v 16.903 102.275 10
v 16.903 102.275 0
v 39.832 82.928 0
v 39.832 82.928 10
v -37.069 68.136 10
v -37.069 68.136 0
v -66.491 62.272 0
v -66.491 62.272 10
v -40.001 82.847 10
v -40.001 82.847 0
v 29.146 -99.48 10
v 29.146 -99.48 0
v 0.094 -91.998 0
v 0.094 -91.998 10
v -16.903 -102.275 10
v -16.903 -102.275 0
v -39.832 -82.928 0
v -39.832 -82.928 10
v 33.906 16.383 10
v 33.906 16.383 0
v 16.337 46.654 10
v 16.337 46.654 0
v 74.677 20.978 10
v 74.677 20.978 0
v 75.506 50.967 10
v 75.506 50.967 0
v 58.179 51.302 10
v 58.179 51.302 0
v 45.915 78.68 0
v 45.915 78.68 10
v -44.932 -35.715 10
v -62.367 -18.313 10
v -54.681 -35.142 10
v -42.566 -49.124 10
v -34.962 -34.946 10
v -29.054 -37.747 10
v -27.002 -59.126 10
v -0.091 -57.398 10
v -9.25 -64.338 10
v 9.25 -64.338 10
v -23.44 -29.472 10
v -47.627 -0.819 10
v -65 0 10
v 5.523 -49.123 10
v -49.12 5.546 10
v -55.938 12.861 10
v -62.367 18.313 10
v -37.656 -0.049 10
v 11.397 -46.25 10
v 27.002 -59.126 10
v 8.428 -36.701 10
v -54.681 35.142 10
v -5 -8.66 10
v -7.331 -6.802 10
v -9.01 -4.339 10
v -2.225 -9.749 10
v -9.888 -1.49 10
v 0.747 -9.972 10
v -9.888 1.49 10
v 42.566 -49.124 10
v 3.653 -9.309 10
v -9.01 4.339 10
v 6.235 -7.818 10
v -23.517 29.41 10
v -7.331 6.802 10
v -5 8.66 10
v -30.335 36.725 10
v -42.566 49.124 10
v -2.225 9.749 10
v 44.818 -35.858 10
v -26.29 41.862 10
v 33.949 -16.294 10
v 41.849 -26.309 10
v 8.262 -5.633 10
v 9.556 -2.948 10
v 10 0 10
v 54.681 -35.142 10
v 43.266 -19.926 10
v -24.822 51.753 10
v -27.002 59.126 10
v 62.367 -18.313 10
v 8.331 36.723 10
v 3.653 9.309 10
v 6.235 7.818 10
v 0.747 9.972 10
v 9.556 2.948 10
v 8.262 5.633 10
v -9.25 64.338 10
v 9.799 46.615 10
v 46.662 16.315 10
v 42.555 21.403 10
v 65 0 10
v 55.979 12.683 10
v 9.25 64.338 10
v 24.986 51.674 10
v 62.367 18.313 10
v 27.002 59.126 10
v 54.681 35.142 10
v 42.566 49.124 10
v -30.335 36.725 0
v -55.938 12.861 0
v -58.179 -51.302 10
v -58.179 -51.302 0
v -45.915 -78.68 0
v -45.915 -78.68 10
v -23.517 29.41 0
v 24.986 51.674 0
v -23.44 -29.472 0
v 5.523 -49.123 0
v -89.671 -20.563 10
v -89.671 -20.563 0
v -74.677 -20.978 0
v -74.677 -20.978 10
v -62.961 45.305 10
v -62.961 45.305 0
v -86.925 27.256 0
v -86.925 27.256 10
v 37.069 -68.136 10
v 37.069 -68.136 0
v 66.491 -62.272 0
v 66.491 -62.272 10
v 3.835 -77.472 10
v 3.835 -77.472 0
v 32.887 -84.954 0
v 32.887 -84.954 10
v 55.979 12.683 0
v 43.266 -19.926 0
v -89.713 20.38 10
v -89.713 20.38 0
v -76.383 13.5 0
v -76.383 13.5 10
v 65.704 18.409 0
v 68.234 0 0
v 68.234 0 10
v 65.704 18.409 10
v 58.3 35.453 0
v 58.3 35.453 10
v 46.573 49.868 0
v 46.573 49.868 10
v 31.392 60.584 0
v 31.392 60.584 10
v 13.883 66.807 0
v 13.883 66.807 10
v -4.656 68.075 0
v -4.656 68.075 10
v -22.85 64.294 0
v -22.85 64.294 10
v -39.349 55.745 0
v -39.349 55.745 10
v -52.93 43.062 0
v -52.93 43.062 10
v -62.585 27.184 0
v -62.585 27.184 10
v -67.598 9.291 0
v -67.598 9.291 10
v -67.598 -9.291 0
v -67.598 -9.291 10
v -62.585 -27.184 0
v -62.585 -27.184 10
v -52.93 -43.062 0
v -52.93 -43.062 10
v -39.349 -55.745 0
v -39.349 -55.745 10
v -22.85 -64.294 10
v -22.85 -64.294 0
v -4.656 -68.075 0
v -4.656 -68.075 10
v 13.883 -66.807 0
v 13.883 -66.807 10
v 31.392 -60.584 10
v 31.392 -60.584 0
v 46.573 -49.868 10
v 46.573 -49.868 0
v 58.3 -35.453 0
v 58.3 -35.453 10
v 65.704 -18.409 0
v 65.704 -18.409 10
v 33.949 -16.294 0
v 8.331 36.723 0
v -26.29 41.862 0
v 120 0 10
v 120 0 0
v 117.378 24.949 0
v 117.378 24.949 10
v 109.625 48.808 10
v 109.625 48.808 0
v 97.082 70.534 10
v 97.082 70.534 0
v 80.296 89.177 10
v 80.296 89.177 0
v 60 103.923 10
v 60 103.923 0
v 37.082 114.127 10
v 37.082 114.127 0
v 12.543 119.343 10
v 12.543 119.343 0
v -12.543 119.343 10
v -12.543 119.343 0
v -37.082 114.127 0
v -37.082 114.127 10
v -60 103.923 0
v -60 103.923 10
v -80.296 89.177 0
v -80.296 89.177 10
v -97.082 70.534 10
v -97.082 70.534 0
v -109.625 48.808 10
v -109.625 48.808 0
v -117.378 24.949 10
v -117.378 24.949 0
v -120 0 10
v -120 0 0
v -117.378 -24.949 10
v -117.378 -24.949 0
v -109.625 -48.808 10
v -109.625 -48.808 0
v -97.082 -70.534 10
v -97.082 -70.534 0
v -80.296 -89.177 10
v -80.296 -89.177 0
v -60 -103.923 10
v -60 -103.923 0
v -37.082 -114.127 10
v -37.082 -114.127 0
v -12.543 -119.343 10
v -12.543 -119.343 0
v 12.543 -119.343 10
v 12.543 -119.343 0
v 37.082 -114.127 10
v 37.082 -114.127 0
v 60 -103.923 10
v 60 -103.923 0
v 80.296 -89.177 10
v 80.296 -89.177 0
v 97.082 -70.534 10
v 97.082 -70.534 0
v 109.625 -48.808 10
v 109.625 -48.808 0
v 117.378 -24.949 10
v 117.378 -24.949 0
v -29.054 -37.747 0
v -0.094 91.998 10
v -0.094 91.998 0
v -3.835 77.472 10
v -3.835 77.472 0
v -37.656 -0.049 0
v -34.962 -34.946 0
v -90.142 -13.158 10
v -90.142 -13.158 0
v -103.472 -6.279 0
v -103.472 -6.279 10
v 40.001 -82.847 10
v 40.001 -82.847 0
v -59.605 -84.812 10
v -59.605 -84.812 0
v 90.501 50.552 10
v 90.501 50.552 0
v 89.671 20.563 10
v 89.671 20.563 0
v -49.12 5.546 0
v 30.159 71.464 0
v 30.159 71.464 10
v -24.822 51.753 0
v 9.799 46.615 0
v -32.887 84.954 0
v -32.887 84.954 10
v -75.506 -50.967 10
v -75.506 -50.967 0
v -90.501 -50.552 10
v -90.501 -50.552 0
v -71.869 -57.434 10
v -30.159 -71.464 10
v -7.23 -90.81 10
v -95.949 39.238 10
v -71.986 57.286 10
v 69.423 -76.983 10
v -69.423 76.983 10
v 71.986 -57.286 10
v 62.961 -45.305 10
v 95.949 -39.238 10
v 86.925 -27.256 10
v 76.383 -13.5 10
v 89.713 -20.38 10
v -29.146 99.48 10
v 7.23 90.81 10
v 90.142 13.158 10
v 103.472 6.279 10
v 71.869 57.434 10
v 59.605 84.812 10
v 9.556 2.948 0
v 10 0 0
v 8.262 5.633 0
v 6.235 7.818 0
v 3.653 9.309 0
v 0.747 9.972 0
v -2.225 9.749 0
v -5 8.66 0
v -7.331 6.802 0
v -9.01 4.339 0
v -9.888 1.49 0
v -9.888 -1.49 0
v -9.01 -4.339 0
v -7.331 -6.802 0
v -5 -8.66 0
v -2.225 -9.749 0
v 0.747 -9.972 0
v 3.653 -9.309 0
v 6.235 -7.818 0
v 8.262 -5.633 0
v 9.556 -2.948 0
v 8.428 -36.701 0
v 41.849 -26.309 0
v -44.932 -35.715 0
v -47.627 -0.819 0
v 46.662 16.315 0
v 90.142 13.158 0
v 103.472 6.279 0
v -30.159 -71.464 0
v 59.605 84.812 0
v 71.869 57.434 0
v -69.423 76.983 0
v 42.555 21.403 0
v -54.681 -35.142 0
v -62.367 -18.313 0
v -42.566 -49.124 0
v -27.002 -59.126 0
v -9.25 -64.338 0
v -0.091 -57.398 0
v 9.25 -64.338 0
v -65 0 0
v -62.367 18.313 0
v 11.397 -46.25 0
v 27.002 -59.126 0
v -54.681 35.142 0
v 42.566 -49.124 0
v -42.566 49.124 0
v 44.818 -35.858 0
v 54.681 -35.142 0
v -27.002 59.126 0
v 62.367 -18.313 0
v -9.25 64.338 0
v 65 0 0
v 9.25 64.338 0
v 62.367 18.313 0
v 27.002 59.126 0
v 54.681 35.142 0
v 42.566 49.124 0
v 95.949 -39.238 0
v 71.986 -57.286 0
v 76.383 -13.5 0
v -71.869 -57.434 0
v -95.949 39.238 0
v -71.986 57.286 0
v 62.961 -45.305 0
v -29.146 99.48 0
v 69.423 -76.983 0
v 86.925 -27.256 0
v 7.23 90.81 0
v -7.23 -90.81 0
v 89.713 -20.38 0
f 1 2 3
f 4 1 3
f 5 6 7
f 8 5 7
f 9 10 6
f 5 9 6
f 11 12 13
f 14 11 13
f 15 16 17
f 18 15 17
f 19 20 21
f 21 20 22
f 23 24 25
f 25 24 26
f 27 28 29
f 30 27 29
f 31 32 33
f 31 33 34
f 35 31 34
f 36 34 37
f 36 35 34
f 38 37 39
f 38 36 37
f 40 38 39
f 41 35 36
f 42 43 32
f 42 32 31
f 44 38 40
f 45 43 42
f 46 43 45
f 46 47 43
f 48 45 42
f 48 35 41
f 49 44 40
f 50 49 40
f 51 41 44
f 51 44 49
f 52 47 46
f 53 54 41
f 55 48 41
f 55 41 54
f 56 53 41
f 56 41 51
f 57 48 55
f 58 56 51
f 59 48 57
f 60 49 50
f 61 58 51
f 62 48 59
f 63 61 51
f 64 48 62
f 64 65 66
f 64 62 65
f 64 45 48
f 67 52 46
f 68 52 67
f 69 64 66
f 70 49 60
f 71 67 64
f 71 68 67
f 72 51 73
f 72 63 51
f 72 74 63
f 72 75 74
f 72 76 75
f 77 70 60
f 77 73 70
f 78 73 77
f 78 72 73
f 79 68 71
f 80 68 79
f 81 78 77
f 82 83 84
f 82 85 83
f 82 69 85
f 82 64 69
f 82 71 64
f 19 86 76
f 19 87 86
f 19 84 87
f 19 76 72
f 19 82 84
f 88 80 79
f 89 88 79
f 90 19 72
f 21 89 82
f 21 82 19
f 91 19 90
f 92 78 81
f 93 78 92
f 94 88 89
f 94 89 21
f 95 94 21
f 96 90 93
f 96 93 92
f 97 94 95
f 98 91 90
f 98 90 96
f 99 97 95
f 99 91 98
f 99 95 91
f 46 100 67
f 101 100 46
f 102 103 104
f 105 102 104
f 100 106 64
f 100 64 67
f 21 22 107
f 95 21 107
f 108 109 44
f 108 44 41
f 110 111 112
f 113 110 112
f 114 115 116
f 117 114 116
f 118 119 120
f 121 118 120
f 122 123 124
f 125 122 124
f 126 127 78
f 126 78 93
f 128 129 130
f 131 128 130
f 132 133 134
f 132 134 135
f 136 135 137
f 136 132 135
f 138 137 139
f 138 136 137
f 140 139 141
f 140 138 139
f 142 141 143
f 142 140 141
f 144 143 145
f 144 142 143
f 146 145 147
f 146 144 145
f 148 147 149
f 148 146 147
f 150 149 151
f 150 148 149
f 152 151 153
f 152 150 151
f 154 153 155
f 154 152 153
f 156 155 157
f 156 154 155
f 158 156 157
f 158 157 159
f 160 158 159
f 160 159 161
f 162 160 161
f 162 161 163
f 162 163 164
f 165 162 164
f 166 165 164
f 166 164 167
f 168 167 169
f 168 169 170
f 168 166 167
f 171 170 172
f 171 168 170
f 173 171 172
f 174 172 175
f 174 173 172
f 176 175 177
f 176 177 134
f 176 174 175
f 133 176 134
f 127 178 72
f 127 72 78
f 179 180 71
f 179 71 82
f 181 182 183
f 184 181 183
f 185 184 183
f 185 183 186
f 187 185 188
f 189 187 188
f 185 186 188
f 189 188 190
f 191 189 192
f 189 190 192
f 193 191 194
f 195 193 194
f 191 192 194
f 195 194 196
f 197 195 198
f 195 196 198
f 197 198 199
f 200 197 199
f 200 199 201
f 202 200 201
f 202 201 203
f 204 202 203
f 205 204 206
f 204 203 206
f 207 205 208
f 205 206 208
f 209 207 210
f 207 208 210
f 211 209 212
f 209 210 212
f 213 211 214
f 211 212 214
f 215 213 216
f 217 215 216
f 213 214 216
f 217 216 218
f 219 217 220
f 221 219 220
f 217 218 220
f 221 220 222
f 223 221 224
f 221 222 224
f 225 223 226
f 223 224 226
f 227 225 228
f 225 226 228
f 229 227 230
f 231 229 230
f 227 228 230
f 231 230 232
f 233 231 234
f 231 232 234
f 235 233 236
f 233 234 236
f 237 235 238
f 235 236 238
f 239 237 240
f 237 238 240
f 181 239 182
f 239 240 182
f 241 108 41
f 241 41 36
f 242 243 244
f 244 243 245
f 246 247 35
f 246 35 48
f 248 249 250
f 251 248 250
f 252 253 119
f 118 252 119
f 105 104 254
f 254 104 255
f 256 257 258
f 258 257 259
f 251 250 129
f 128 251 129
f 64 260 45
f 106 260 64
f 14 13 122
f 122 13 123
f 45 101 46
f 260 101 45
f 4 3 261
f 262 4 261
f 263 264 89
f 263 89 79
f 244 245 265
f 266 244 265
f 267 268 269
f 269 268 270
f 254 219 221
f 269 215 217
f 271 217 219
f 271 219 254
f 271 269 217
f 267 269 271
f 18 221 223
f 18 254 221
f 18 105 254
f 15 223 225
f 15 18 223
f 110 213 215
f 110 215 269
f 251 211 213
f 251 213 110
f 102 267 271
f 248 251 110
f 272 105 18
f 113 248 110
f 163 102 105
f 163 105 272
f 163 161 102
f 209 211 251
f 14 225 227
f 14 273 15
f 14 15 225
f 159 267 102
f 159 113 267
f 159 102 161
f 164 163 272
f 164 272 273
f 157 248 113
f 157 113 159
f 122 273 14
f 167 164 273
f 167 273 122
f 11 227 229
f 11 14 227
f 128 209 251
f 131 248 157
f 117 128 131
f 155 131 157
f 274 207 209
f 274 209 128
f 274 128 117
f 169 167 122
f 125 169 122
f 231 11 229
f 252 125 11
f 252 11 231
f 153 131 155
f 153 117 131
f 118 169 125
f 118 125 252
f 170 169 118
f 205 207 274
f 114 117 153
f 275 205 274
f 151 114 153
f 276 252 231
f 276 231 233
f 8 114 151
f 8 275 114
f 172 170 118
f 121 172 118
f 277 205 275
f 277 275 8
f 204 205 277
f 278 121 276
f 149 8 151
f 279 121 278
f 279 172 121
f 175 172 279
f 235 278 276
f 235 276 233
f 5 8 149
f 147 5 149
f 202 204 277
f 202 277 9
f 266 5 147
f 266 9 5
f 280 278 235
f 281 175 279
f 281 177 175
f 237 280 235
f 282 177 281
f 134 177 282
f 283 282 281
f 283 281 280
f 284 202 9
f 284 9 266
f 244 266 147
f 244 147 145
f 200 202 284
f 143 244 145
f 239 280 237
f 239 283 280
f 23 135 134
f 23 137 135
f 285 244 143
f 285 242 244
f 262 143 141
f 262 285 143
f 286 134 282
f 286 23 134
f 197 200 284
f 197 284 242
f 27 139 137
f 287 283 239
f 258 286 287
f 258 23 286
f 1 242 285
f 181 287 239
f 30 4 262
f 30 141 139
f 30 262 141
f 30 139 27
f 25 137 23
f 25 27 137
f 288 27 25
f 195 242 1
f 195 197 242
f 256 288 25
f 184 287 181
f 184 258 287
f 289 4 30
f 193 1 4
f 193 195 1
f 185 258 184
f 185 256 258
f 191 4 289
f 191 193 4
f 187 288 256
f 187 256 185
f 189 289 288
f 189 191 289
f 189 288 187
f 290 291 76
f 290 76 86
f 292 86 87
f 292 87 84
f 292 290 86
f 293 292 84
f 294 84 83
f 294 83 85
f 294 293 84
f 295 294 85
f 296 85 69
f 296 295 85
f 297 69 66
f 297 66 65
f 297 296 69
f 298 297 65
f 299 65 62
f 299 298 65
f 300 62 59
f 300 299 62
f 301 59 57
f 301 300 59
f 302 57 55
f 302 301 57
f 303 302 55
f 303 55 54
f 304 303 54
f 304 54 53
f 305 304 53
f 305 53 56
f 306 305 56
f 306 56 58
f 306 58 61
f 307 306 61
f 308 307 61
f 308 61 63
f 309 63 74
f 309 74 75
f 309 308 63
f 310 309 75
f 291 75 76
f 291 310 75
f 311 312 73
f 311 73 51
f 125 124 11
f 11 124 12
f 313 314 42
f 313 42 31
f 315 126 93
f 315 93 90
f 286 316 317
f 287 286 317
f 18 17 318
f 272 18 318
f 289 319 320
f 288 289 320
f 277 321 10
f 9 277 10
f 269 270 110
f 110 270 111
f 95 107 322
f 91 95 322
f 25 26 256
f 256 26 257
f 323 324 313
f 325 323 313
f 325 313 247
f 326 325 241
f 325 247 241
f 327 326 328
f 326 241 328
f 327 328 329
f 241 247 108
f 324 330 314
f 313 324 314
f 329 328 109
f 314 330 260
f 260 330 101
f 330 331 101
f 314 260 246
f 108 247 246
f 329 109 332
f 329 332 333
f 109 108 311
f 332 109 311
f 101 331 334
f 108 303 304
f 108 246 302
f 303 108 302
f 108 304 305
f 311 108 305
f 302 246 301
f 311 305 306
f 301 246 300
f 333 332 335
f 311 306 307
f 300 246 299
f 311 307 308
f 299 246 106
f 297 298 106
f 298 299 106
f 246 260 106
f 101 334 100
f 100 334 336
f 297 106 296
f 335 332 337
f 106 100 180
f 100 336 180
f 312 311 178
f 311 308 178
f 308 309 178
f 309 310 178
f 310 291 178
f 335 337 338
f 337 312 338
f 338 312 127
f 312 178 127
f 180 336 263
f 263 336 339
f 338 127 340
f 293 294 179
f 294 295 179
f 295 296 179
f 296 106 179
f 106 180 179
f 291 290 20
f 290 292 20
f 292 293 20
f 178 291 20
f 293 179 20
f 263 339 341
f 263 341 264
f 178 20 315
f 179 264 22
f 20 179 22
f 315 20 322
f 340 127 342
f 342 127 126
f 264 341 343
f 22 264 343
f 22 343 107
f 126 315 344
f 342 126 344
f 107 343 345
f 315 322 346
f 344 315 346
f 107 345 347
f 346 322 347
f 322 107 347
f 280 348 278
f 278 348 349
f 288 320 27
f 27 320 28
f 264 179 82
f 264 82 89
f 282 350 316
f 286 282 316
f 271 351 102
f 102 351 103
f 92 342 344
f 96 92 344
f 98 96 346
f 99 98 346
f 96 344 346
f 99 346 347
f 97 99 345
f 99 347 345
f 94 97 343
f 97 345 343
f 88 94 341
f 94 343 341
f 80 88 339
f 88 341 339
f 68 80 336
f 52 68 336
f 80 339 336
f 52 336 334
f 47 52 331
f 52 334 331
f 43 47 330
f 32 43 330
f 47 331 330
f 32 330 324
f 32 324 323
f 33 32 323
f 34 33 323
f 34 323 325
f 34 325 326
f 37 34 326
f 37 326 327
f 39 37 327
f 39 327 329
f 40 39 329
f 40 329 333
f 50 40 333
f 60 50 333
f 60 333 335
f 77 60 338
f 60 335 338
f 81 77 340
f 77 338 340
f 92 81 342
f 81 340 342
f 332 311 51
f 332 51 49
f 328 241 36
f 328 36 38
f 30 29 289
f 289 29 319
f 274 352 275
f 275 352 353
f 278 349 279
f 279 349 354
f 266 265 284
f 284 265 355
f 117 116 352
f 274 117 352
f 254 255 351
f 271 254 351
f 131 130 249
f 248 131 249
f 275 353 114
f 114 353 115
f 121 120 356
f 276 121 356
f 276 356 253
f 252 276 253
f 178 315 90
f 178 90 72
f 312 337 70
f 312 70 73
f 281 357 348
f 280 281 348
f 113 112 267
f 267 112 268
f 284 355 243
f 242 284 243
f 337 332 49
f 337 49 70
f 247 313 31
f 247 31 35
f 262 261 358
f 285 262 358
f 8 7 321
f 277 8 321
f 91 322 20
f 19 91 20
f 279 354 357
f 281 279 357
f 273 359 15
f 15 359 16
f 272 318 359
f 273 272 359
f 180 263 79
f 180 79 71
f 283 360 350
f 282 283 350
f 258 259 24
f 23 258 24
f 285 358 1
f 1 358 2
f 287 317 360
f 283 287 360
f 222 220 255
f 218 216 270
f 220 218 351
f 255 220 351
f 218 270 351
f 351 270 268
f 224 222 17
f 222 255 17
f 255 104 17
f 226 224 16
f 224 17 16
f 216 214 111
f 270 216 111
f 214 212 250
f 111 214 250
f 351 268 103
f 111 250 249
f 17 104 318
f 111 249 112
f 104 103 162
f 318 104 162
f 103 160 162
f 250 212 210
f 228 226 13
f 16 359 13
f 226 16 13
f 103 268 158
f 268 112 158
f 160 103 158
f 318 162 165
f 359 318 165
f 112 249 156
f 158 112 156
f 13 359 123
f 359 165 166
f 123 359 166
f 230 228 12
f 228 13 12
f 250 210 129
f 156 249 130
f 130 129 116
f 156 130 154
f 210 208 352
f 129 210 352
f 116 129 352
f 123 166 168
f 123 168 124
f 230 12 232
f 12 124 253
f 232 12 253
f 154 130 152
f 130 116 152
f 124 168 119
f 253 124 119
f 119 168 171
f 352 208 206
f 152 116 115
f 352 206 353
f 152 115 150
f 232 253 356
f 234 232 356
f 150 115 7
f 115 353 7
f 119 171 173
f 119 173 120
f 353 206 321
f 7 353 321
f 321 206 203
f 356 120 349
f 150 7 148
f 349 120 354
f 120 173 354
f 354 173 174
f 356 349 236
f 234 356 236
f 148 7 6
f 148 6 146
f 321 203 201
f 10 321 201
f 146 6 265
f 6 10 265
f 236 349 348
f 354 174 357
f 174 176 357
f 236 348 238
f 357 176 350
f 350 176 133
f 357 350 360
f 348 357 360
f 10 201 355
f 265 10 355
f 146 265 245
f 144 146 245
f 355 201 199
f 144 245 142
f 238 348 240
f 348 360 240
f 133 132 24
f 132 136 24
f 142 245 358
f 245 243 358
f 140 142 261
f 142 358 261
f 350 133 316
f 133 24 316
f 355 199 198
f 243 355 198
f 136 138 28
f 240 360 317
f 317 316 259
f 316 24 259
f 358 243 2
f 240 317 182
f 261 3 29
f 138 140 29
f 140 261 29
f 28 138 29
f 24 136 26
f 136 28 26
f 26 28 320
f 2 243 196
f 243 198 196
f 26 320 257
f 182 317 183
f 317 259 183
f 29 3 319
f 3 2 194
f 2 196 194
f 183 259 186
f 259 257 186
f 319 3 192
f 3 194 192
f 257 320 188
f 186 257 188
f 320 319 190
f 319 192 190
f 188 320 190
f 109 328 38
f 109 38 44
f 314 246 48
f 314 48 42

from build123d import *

# Parameters (mm, degrees)
SKETCH1_R             = 120
SKETCH1_R_2           = 68.233940928
BOSS_EXTRUDE1_DEPTH   = 10
SKETCH1_R_3           = 65
SKETCH1_R_4           = 10
BOSS_EXTRUDE1_2_DEPTH = 10


with BuildPart() as part:
    # Sketch1 → Boss-Extrude1 (new body)
    with BuildSketch(Plane.XY):
        Circle(SKETCH1_R)
        Circle(SKETCH1_R_2, mode=Mode.SUBTRACT)
        Polygon((58.179164054, 51.301559926), (45.915256889, 78.680321422), (59.604637637, 84.812275004), (71.868544802, 57.433513508), align=None, mode=Mode.SUBTRACT)
        Polygon((75.506329072, 50.966636776), (90.500589895, 50.551736348), (89.670789039, 20.563214701), (74.676528216, 20.978115129), align=None, mode=Mode.SUBTRACT)
        Polygon((90.142446758, 13.158384652), (103.471790408, 6.278806332), (89.712633768, -20.379880968), (76.383290118, -13.500302648), align=None, mode=Mode.SUBTRACT)
        Polygon((86.924747339, -27.256046929), (95.949133832, -39.237718283), (71.985791125, -57.286491269), (62.961404632, -45.304819915), align=None, mode=Mode.SUBTRACT)
        Polygon((66.490535648, -62.272084143), (69.422574562, -76.982731573), (40.001279702, -82.846809401), (37.069240788, -68.136161971), align=None, mode=Mode.SUBTRACT)
        Polygon((32.887057918, -84.954371375), (29.146022988, -99.480370743), (0.094024251, -91.998300882), (3.835059181, -77.472301514), align=None, mode=Mode.SUBTRACT)
        Polygon((-7.230104965, -90.810403459), (-16.903255892, -102.274702441), (-39.831853856, -82.928400589), (-30.15870293, -71.464101606), align=None, mode=Mode.SUBTRACT)
        Polygon((-45.915256889, -78.680321422), (-59.604637637, -84.812275004), (-71.868544802, -57.433513508), (-58.179164054, -51.301559926), align=None, mode=Mode.SUBTRACT)
        Polygon((-75.506329072, -50.966636776), (-90.500589895, -50.551736348), (-89.670789039, -20.563214701), (-74.676528216, -20.978115129), align=None, mode=Mode.SUBTRACT)
        Polygon((-90.142446758, -13.158384652), (-103.471790408, -6.278806332), (-89.712633768, 20.379880968), (-76.383290118, 13.500302648), align=None, mode=Mode.SUBTRACT)
        Polygon((-86.924747339, 27.256046929), (-95.949133832, 39.237718283), (-71.985791125, 57.286491269), (-62.961404632, 45.304819915), align=None, mode=Mode.SUBTRACT)
        Polygon((-66.490535648, 62.272084143), (-69.422574562, 76.982731573), (-40.001279702, 82.846809401), (-37.069240788, 68.136161971), align=None, mode=Mode.SUBTRACT)
        Polygon((-32.887057918, 84.954371375), (-29.146022988, 99.480370743), (-0.094024251, 91.998300882), (-3.835059181, 77.472301514), align=None, mode=Mode.SUBTRACT)
        Polygon((7.230104965, 90.810403459), (16.903255892, 102.274702441), (39.831853856, 82.928400589), (30.15870293, 71.464101606), align=None, mode=Mode.SUBTRACT)
    extrude(amount=BOSS_EXTRUDE1_DEPTH)


with BuildPart() as body_2:
    # Sketch1 → Boss-Extrude1 2 (new body)
    with BuildSketch(Plane.XY):
        Circle(SKETCH1_R_3)
        Circle(SKETCH1_R_4, mode=Mode.SUBTRACT)
        Polygon((24.986251453, 51.67388548), (42.554599527, 21.402560006), (33.905649392, 16.383031985), (16.337301318, 46.654357459), align=None, mode=Mode.SUBTRACT)
        Polygon((46.661986217, 16.315499579), (33.948596805, -16.293850762), (43.265554046, -19.926247737), (55.978943458, 12.683102604), align=None, mode=Mode.SUBTRACT)
        Polygon((41.849243764, -26.309262259), (8.427558399, -36.701131551), (11.396663911, -46.250184513), (44.818349276, -35.858315221), align=None, mode=Mode.SUBTRACT)
        Polygon((5.523167187, -49.122613005), (-23.439603373, -29.471711716), (-29.054146598, -37.746789018), (-0.091376038, -57.397690308), align=None, mode=Mode.SUBTRACT)
        Polygon((-34.961966933, -34.945634239), (-37.656265724, -0.049491845), (-47.626592122, -0.819291499), (-44.932293332, -35.715433894), align=None, mode=Mode.SUBTRACT)
        Polygon((-49.120026859, 5.54611987), (-23.516991937, 29.409996395), (-30.335242373, 36.725149229), (-55.938277295, 12.861272705), align=None, mode=Mode.SUBTRACT)
        Polygon((-26.289704694, 41.861532597), (8.331056437, 36.723157494), (9.799163609, 46.614803532), (-24.821597522, 51.753178634), align=None, mode=Mode.SUBTRACT)
    extrude(amount=BOSS_EXTRUDE1_2_DEPTH)


solid = Compound([part.part, body_2.part])
